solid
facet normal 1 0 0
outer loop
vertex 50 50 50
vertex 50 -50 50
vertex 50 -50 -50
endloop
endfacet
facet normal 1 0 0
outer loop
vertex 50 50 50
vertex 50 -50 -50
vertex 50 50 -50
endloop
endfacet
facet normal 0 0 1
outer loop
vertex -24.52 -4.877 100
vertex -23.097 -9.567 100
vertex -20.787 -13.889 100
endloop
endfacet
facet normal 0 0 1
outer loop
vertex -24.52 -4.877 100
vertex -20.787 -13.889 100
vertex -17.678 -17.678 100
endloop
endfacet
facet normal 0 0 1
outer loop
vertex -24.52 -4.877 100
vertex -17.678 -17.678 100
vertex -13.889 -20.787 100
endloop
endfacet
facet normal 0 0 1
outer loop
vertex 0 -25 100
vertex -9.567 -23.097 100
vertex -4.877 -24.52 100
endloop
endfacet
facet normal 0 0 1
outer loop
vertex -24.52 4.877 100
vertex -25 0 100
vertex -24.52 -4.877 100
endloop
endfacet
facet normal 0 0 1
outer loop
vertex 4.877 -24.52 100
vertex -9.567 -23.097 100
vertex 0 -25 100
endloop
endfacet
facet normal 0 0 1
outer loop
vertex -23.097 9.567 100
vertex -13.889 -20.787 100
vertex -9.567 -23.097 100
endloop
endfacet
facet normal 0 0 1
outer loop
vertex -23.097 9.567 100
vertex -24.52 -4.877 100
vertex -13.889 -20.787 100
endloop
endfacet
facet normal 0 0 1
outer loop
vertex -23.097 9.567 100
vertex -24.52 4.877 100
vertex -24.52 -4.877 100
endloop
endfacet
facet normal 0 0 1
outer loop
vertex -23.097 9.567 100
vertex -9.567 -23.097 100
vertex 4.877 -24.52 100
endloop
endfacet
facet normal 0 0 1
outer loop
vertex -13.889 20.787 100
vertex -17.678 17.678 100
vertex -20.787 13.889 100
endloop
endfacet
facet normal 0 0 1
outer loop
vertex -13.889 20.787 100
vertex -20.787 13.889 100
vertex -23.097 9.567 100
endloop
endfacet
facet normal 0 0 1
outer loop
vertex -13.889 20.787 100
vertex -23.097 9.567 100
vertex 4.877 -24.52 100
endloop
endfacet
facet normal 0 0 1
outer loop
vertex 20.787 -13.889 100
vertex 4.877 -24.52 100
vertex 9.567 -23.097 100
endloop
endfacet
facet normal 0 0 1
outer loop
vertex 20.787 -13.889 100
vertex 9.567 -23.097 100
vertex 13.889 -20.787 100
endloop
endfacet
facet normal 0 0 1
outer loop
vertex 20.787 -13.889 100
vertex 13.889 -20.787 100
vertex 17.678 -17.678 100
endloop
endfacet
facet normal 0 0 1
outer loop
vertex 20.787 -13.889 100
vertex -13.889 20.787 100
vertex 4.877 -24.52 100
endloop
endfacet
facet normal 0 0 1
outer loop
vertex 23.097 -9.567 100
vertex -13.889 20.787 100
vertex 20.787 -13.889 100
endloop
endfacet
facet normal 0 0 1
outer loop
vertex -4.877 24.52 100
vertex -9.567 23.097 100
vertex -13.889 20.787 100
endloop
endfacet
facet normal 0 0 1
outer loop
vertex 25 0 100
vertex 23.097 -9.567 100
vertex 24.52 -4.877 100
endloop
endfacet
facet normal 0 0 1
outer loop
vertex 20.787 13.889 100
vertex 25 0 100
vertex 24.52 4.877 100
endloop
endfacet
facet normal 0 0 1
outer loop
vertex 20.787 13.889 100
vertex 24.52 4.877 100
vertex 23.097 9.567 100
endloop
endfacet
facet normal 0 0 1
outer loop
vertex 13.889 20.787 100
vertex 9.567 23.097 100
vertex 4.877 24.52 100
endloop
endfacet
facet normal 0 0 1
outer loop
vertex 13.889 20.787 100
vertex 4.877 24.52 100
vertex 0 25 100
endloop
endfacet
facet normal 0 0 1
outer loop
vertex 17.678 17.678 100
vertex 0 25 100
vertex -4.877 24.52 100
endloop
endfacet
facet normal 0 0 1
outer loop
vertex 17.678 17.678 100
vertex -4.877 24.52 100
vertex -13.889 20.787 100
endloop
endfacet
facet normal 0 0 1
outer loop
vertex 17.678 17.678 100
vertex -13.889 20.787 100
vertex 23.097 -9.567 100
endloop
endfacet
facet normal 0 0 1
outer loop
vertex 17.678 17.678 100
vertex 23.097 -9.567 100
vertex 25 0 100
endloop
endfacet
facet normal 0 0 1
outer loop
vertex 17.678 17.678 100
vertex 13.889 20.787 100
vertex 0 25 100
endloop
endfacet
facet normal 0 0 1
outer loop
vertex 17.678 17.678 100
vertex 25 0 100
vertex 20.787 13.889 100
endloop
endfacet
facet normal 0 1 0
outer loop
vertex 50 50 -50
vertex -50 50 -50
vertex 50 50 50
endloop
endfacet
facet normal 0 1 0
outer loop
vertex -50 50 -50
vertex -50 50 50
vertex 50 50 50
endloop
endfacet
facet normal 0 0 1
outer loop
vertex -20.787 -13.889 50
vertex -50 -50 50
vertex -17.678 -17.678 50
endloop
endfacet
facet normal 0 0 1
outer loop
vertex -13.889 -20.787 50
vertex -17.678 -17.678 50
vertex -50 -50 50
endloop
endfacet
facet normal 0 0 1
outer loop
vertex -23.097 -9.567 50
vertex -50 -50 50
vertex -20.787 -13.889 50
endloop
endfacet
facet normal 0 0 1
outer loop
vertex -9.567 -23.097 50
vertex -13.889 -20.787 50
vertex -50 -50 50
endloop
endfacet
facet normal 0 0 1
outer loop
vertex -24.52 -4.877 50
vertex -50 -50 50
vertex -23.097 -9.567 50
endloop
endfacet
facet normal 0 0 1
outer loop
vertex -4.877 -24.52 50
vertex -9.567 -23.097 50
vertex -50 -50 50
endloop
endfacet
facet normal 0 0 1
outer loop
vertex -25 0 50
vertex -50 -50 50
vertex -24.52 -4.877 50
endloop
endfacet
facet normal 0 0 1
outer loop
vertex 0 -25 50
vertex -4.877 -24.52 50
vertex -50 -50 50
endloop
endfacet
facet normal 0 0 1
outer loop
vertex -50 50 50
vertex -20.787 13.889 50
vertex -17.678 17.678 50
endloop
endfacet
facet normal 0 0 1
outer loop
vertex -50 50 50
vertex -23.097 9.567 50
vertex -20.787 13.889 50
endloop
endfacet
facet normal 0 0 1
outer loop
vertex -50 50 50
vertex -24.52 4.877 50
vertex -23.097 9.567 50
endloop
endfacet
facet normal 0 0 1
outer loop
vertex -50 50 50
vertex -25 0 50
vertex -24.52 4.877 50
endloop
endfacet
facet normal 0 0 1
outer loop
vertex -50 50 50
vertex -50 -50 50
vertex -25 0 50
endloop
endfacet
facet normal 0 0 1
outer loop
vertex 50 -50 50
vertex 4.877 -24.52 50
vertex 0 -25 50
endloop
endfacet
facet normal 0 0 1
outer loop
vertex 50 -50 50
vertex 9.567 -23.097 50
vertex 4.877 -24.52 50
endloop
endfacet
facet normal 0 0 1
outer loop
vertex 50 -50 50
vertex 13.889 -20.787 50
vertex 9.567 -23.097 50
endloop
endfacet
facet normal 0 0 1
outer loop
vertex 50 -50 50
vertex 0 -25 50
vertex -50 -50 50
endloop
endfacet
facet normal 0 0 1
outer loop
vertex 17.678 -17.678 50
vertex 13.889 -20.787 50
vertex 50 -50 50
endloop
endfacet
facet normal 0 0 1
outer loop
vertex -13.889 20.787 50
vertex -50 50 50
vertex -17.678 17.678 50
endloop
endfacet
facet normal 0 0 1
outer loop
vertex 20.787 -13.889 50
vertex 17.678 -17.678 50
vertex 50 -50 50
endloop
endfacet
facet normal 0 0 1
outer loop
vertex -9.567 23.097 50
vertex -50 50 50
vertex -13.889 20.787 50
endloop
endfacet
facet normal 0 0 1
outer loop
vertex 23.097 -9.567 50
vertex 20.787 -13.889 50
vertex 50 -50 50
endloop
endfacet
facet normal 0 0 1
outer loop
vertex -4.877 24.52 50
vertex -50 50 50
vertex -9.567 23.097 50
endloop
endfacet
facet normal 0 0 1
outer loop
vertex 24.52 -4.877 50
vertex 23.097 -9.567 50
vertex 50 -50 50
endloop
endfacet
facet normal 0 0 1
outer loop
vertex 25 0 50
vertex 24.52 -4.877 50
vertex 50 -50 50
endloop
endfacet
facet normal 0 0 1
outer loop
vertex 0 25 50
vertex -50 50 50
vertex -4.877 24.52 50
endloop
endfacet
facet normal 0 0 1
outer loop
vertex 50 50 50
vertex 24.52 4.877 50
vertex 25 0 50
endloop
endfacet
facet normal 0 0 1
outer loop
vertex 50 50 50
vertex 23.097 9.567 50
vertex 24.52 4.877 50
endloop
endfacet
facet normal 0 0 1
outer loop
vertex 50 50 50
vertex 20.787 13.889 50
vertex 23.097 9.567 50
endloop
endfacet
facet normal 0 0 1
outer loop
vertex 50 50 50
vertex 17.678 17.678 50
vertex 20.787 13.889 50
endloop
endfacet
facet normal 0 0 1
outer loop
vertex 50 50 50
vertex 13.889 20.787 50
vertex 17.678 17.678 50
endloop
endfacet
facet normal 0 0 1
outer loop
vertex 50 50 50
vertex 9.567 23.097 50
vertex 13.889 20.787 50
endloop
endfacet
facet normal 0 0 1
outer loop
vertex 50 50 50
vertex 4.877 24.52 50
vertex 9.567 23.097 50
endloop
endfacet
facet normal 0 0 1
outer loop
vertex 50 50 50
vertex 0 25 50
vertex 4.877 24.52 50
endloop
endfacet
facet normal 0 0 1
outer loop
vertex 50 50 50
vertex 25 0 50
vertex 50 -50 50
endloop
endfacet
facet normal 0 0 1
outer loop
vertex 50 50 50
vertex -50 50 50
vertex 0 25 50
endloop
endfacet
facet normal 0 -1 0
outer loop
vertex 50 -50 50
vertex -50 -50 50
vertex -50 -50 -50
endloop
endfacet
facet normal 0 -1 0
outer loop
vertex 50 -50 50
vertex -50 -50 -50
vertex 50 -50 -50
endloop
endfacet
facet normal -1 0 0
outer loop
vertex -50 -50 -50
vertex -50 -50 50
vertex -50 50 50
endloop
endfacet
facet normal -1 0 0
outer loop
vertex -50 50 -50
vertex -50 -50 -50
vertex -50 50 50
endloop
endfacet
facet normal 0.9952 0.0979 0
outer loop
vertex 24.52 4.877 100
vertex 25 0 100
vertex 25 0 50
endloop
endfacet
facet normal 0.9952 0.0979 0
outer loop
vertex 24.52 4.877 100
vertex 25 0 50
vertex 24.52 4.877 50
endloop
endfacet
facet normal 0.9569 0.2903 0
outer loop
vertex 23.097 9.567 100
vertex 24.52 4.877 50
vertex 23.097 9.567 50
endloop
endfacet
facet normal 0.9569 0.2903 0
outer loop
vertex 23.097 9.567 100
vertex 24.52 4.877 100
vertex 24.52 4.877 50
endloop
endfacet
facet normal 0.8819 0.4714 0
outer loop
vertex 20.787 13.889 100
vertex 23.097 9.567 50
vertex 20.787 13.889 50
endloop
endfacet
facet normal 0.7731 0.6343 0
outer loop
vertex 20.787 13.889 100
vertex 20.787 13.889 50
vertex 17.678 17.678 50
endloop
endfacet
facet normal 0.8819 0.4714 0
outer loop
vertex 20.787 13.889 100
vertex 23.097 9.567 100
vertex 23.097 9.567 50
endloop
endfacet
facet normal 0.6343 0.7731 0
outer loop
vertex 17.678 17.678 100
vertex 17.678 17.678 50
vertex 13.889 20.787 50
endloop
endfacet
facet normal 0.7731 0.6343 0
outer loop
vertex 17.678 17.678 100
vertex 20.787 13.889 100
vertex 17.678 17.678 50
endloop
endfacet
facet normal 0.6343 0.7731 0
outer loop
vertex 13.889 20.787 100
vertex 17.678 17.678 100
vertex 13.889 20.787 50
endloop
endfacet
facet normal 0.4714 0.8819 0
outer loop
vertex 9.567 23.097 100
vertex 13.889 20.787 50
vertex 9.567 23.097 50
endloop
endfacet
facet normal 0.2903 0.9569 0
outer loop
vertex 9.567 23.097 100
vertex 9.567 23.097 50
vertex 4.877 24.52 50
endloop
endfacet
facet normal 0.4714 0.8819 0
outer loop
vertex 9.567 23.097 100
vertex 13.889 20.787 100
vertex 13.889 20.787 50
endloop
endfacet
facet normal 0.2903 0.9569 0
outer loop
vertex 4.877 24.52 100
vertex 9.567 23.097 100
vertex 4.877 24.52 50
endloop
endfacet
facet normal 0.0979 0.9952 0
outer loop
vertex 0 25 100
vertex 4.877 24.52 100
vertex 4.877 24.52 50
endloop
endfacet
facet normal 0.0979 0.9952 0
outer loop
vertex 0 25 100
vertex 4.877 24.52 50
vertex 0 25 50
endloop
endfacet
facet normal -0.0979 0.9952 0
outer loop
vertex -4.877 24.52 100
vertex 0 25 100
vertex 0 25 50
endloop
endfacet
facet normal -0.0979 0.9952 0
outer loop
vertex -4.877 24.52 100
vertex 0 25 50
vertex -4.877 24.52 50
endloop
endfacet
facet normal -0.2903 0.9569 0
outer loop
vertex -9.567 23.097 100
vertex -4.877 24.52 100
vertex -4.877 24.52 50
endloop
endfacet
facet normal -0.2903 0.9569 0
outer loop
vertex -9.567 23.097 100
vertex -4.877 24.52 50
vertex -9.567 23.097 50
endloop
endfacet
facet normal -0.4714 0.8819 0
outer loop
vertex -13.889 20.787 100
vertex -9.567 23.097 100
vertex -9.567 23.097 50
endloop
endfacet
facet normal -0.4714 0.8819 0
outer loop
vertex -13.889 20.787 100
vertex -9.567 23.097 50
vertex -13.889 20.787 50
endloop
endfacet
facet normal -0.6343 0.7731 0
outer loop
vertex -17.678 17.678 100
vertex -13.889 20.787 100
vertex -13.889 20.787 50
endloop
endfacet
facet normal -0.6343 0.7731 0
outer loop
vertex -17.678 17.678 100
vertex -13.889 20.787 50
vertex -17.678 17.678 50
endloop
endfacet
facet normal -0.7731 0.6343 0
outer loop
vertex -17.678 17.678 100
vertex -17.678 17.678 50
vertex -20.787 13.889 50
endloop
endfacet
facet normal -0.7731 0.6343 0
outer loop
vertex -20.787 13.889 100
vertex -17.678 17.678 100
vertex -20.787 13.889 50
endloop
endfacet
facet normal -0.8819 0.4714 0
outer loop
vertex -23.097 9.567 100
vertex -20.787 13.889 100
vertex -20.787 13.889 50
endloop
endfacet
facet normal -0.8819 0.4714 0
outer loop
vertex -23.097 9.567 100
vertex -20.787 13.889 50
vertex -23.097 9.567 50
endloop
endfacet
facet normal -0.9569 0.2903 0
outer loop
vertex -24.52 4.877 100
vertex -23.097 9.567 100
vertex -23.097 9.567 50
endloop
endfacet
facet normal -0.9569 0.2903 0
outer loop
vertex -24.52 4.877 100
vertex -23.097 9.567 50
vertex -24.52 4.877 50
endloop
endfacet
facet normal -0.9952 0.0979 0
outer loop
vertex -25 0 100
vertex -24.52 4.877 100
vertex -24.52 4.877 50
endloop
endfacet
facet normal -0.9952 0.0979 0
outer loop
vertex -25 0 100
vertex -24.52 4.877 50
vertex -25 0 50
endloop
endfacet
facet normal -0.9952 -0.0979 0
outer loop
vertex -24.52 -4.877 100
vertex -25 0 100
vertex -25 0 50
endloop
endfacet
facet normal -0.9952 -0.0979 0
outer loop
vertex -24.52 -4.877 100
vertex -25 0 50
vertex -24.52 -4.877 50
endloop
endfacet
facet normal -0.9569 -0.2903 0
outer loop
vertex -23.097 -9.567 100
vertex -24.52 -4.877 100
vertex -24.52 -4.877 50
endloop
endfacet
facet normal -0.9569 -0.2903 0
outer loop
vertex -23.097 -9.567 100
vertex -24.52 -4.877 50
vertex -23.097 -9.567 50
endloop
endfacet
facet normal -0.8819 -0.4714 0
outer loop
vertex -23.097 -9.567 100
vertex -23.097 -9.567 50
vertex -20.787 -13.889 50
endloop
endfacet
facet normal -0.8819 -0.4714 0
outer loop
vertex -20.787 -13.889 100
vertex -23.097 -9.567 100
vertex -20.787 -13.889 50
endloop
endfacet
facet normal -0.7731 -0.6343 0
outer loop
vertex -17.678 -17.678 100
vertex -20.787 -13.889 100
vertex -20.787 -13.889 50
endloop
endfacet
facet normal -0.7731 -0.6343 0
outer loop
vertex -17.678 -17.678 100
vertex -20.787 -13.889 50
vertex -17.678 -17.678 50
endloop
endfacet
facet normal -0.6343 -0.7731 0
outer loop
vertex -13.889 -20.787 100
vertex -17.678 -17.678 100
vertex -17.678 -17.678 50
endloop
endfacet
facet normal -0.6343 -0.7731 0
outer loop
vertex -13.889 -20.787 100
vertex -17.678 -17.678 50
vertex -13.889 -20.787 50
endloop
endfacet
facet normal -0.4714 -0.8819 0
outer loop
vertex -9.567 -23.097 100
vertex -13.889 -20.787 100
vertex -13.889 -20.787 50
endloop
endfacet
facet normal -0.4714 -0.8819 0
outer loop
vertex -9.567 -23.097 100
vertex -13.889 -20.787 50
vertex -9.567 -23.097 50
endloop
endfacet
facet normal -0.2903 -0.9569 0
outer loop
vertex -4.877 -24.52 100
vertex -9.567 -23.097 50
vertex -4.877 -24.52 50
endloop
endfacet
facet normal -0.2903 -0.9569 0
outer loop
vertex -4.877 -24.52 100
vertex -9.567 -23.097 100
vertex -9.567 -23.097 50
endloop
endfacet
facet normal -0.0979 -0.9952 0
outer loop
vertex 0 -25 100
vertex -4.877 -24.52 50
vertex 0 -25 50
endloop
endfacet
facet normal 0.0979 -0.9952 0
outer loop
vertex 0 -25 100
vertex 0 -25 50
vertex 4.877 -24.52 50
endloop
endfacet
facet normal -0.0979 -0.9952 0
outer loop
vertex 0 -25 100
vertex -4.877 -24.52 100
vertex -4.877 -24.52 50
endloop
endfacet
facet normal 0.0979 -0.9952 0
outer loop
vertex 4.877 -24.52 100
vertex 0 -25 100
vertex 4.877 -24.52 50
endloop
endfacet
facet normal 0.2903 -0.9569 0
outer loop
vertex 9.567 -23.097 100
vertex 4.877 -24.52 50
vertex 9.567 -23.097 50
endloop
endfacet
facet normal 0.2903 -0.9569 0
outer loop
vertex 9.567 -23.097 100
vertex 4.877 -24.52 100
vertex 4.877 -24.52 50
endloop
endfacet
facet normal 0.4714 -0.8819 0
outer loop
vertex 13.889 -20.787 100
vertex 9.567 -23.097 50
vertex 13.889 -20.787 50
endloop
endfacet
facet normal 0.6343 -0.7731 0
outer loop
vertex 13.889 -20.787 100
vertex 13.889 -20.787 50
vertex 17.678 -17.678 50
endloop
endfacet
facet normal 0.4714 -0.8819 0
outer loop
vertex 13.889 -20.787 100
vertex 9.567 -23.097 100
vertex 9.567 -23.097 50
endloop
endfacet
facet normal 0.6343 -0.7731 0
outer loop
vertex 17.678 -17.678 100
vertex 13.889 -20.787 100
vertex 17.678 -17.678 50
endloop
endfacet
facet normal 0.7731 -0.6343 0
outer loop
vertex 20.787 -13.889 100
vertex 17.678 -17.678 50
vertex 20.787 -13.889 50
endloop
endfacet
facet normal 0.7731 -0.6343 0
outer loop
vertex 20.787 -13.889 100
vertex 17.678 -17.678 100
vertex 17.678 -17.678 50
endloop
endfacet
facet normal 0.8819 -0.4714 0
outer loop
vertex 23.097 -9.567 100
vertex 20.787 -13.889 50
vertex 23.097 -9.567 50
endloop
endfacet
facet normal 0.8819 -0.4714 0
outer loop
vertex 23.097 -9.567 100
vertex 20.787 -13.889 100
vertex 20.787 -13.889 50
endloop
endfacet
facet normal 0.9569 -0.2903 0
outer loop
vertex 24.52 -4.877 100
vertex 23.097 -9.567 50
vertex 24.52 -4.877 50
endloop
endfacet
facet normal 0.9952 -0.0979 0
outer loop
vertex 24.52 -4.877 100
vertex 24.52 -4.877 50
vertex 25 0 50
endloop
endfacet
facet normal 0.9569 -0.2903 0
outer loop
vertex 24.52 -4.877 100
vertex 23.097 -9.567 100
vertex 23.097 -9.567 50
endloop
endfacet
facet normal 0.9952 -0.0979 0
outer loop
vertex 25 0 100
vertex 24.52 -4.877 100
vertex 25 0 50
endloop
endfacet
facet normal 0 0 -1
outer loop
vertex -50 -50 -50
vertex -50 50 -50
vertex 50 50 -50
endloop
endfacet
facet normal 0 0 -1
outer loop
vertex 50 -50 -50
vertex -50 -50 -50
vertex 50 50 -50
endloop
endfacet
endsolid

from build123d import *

# Parameters (mm, degrees)
BOSS_EXTRUDE1_DEPTH      = 50
BOSS_EXTRUDE1_DEPTH_BACK = 50
SKETCH1_W                = 100
SKETCH1_H                = 100
SKETCH2_R                = 25
BOSS_EXTRUDE2_DEPTH      = 60


with BuildPart() as part:
    # Sketch1 → Boss-Extrude1 (new, two sides: drawn at the far end of the back side and taken through both)
    with BuildSketch(Plane.XY.offset(-BOSS_EXTRUDE1_DEPTH_BACK)):
        Rectangle(SKETCH1_W, SKETCH1_H)
    extrude(amount=BOSS_EXTRUDE1_DEPTH + BOSS_EXTRUDE1_DEPTH_BACK)

    # Sketch2 → Boss-Extrude2 (add)
    with BuildSketch(Plane.XY.offset(100)):
        Circle(SKETCH2_R)
    extrude(amount=-BOSS_EXTRUDE2_DEPTH)


solid = part.part
